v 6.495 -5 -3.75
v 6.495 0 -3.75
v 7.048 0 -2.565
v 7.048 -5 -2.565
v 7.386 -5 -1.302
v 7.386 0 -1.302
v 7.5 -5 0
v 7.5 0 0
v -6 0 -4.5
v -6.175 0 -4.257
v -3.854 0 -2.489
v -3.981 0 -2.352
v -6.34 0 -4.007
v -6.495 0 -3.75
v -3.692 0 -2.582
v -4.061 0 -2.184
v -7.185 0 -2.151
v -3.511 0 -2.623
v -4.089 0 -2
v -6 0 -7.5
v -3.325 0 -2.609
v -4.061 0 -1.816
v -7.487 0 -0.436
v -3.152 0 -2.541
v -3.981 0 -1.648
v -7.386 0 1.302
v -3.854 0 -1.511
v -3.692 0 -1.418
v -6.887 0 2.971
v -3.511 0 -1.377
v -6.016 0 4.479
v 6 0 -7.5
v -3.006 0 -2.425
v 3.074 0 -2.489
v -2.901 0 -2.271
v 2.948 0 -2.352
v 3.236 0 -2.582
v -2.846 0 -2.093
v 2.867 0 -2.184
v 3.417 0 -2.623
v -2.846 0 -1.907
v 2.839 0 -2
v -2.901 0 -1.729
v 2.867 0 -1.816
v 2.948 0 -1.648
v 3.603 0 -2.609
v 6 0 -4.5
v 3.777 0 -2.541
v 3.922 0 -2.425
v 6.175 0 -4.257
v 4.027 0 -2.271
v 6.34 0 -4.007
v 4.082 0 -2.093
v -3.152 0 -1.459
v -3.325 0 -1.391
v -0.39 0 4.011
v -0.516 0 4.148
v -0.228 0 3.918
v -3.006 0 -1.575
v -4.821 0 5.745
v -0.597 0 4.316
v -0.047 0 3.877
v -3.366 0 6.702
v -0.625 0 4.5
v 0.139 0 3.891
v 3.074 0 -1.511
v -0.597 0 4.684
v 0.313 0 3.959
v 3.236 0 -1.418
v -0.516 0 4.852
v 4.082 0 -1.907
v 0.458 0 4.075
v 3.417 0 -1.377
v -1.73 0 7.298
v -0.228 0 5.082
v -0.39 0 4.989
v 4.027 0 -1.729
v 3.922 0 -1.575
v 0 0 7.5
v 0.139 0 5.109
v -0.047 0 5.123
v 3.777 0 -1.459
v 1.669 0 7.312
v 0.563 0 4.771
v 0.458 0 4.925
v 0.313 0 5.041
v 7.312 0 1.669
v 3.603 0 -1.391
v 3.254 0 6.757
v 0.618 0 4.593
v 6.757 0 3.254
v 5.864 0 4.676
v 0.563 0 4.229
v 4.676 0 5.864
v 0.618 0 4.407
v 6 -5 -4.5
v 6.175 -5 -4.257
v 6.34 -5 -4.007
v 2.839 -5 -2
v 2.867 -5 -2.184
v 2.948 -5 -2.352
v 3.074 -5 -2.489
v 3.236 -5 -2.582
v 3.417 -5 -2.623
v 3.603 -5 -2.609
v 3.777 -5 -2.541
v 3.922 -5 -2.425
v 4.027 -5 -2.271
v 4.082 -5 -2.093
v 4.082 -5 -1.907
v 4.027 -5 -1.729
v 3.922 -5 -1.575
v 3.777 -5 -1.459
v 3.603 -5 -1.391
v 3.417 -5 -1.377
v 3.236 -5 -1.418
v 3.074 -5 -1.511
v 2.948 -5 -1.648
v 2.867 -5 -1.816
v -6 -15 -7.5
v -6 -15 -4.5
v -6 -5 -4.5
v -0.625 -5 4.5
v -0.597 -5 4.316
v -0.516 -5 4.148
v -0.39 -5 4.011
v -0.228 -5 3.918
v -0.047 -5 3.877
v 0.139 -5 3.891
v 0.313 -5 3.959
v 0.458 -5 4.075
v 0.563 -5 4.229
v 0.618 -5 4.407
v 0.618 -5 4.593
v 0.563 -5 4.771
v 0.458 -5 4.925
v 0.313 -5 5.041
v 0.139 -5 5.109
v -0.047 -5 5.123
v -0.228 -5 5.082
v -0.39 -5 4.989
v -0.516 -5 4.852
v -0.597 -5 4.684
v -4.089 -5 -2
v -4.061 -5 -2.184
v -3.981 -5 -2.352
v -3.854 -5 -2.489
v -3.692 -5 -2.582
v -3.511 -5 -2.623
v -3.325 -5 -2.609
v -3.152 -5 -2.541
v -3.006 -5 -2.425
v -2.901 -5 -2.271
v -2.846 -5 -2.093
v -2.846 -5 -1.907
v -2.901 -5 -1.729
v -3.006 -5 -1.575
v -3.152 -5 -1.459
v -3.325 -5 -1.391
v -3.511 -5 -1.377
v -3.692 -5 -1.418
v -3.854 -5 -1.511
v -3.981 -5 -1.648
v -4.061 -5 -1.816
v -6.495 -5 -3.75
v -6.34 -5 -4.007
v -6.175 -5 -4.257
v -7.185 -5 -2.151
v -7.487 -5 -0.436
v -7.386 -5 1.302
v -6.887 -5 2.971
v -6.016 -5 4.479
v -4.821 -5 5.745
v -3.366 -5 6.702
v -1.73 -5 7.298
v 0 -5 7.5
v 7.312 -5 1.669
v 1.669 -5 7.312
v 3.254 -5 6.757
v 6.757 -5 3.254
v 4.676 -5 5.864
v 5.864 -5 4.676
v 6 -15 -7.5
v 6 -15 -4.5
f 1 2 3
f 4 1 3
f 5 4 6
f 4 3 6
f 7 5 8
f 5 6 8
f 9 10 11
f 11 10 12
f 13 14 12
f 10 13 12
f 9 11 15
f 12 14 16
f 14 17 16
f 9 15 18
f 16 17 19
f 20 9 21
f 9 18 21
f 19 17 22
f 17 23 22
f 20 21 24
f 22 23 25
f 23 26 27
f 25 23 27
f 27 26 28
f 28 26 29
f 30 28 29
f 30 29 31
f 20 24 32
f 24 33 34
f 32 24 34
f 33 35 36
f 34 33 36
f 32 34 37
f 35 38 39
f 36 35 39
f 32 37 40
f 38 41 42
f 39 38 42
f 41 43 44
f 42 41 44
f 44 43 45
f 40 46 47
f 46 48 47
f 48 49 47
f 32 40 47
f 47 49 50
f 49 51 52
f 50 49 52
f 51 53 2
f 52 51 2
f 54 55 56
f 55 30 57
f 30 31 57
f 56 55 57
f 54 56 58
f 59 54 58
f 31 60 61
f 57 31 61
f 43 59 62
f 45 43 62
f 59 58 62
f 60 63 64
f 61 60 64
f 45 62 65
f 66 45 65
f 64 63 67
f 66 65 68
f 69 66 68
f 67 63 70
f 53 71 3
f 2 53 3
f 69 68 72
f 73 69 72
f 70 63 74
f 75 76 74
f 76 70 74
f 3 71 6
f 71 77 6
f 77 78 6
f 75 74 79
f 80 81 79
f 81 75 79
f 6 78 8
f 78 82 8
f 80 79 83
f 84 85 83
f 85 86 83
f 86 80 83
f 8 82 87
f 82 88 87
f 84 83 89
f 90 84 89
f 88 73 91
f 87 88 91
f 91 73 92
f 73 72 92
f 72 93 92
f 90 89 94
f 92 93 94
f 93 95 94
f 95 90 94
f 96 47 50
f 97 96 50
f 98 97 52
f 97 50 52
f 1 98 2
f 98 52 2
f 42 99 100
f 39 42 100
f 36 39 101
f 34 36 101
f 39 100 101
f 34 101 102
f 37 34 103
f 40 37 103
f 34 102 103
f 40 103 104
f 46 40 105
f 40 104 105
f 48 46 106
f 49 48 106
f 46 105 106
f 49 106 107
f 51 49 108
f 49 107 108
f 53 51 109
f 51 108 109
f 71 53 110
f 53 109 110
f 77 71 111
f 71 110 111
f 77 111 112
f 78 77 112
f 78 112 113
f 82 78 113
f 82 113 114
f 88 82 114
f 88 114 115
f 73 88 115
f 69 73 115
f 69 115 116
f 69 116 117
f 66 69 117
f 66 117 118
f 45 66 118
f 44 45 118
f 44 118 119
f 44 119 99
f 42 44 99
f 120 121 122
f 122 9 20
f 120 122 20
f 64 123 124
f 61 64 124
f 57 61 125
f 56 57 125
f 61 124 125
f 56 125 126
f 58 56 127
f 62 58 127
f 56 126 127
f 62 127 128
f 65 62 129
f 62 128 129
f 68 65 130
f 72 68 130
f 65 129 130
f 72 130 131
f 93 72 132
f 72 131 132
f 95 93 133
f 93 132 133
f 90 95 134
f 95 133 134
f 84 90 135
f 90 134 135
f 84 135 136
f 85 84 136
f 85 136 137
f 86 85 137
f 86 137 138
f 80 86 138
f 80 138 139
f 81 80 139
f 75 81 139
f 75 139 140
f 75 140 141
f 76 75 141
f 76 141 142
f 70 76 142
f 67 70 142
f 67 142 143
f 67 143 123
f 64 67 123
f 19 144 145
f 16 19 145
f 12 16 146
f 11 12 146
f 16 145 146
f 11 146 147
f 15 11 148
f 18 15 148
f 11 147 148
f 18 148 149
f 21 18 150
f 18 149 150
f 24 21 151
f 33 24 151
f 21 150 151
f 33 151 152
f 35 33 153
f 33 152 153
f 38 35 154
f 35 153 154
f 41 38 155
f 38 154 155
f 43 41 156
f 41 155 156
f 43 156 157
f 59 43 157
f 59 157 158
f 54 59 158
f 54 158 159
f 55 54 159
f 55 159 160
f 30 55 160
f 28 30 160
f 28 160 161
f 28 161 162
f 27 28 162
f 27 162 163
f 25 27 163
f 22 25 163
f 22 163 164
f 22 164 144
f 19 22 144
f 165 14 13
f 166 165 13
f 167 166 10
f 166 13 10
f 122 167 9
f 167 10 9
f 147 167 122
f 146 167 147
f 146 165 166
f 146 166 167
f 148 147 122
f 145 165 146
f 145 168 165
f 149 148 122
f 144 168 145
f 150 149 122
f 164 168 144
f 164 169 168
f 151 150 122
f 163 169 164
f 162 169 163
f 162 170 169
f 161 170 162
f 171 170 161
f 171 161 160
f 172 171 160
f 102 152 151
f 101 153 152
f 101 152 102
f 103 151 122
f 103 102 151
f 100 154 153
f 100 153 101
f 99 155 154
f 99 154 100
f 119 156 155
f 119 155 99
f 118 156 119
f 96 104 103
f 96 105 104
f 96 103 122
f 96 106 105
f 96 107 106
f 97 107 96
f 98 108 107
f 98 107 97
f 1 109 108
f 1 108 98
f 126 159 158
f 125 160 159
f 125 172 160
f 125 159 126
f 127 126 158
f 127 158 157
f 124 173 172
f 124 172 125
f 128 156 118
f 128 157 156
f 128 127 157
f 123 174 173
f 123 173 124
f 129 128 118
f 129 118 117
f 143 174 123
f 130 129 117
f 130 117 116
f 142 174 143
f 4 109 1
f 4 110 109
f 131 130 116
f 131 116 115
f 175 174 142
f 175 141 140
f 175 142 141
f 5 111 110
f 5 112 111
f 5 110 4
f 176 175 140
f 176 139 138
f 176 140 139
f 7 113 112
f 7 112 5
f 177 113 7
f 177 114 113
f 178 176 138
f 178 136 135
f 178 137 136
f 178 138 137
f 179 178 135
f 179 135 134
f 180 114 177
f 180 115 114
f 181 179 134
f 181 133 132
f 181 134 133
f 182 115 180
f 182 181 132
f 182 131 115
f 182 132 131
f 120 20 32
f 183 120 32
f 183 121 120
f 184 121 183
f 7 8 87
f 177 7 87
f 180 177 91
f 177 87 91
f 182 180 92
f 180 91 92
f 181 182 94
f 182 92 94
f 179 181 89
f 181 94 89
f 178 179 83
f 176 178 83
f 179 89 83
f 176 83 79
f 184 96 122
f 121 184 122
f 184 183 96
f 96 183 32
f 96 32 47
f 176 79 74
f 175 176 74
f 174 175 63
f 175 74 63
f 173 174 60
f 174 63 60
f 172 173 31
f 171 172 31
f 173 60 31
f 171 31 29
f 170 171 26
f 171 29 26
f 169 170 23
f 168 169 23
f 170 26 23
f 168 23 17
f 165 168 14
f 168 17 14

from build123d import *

# Parameters (mm, degrees)
F1_DEPTH = 5
F2_DEPTH = 15
F3_D     = 1.25


with BuildPart() as f1:
    # F0 (on Front) → F1 (new body)
    with BuildSketch(Plane.XZ):
        with BuildLine():
            ThreePointArc((6.4951905284, -3.75), (7.2444436972, -1.9411428383), (7.5, 0))
            ThreePointArc((7.5, 0), (5.3033008589, 5.3033008589), (0, 7.5))
            Line((0, 7.5), (0, 0))
            Line((0, 0), (6.4951905284, -3.75))
        make_face()
        with BuildLine():
            Line((0, 0), (0, 7.5))
            ThreePointArc((0, 7.5), (-6.4951905284, 3.75), (-6.4951905284, -3.75))
            Line((-6.4951905284, -3.75), (0, 0))
        make_face()
        with BuildLine():
            ThreePointArc((6, -4.5), (6.2588394759, -4.1324240362), (6.4951905284, -3.75))
            Line((6.4951905284, -3.75), (0, 0))
            Line((0, 0), (-6.4951905284, -3.75))
            ThreePointArc((-6.4951905284, -3.75), (-6.2588394759, -4.1324240362), (-6, -4.5))
            Line((-6, -4.5), (6, -4.5))
        make_face()
    extrude(amount=F1_DEPTH)

    # F0 (on Front) → F2 (join)
    with BuildSketch(Plane.XZ):
        with BuildLine():
            ThreePointArc((0, -7.5), (3.3541019662, -6.7082039325), (6, -4.5))
            Line((6, -4.5), (-6, -4.5))
            ThreePointArc((-6, -4.5), (-3.3541019662, -6.7082039325), (0, -7.5))
        make_face()
        with BuildLine():
            Line((6, -7.5), (6, -4.5))
            ThreePointArc((6, -4.5), (3.3541019662, -6.7082039325), (0, -7.5))
            Line((0, -7.5), (6, -7.5))
        make_face()
        with BuildLine():
            ThreePointArc((0, -7.5), (-3.3541019662, -6.7082039325), (-6, -4.5))
            Line((-6, -4.5), (-6, -7.5))
            Line((-6, -7.5), (0, -7.5))
        make_face()
    extrude(amount=F2_DEPTH)

    # F3 (through all)
    with Locations(Plane(origin=(0, 0, 0), x_dir=(1, 0, 0), z_dir=(0, 1, 0))):
        with Locations((3.4641016151, 2), (-3.4641016151, 2), (0, -4.5)):
            Hole(F3_D / 2)


solid = f1.part
